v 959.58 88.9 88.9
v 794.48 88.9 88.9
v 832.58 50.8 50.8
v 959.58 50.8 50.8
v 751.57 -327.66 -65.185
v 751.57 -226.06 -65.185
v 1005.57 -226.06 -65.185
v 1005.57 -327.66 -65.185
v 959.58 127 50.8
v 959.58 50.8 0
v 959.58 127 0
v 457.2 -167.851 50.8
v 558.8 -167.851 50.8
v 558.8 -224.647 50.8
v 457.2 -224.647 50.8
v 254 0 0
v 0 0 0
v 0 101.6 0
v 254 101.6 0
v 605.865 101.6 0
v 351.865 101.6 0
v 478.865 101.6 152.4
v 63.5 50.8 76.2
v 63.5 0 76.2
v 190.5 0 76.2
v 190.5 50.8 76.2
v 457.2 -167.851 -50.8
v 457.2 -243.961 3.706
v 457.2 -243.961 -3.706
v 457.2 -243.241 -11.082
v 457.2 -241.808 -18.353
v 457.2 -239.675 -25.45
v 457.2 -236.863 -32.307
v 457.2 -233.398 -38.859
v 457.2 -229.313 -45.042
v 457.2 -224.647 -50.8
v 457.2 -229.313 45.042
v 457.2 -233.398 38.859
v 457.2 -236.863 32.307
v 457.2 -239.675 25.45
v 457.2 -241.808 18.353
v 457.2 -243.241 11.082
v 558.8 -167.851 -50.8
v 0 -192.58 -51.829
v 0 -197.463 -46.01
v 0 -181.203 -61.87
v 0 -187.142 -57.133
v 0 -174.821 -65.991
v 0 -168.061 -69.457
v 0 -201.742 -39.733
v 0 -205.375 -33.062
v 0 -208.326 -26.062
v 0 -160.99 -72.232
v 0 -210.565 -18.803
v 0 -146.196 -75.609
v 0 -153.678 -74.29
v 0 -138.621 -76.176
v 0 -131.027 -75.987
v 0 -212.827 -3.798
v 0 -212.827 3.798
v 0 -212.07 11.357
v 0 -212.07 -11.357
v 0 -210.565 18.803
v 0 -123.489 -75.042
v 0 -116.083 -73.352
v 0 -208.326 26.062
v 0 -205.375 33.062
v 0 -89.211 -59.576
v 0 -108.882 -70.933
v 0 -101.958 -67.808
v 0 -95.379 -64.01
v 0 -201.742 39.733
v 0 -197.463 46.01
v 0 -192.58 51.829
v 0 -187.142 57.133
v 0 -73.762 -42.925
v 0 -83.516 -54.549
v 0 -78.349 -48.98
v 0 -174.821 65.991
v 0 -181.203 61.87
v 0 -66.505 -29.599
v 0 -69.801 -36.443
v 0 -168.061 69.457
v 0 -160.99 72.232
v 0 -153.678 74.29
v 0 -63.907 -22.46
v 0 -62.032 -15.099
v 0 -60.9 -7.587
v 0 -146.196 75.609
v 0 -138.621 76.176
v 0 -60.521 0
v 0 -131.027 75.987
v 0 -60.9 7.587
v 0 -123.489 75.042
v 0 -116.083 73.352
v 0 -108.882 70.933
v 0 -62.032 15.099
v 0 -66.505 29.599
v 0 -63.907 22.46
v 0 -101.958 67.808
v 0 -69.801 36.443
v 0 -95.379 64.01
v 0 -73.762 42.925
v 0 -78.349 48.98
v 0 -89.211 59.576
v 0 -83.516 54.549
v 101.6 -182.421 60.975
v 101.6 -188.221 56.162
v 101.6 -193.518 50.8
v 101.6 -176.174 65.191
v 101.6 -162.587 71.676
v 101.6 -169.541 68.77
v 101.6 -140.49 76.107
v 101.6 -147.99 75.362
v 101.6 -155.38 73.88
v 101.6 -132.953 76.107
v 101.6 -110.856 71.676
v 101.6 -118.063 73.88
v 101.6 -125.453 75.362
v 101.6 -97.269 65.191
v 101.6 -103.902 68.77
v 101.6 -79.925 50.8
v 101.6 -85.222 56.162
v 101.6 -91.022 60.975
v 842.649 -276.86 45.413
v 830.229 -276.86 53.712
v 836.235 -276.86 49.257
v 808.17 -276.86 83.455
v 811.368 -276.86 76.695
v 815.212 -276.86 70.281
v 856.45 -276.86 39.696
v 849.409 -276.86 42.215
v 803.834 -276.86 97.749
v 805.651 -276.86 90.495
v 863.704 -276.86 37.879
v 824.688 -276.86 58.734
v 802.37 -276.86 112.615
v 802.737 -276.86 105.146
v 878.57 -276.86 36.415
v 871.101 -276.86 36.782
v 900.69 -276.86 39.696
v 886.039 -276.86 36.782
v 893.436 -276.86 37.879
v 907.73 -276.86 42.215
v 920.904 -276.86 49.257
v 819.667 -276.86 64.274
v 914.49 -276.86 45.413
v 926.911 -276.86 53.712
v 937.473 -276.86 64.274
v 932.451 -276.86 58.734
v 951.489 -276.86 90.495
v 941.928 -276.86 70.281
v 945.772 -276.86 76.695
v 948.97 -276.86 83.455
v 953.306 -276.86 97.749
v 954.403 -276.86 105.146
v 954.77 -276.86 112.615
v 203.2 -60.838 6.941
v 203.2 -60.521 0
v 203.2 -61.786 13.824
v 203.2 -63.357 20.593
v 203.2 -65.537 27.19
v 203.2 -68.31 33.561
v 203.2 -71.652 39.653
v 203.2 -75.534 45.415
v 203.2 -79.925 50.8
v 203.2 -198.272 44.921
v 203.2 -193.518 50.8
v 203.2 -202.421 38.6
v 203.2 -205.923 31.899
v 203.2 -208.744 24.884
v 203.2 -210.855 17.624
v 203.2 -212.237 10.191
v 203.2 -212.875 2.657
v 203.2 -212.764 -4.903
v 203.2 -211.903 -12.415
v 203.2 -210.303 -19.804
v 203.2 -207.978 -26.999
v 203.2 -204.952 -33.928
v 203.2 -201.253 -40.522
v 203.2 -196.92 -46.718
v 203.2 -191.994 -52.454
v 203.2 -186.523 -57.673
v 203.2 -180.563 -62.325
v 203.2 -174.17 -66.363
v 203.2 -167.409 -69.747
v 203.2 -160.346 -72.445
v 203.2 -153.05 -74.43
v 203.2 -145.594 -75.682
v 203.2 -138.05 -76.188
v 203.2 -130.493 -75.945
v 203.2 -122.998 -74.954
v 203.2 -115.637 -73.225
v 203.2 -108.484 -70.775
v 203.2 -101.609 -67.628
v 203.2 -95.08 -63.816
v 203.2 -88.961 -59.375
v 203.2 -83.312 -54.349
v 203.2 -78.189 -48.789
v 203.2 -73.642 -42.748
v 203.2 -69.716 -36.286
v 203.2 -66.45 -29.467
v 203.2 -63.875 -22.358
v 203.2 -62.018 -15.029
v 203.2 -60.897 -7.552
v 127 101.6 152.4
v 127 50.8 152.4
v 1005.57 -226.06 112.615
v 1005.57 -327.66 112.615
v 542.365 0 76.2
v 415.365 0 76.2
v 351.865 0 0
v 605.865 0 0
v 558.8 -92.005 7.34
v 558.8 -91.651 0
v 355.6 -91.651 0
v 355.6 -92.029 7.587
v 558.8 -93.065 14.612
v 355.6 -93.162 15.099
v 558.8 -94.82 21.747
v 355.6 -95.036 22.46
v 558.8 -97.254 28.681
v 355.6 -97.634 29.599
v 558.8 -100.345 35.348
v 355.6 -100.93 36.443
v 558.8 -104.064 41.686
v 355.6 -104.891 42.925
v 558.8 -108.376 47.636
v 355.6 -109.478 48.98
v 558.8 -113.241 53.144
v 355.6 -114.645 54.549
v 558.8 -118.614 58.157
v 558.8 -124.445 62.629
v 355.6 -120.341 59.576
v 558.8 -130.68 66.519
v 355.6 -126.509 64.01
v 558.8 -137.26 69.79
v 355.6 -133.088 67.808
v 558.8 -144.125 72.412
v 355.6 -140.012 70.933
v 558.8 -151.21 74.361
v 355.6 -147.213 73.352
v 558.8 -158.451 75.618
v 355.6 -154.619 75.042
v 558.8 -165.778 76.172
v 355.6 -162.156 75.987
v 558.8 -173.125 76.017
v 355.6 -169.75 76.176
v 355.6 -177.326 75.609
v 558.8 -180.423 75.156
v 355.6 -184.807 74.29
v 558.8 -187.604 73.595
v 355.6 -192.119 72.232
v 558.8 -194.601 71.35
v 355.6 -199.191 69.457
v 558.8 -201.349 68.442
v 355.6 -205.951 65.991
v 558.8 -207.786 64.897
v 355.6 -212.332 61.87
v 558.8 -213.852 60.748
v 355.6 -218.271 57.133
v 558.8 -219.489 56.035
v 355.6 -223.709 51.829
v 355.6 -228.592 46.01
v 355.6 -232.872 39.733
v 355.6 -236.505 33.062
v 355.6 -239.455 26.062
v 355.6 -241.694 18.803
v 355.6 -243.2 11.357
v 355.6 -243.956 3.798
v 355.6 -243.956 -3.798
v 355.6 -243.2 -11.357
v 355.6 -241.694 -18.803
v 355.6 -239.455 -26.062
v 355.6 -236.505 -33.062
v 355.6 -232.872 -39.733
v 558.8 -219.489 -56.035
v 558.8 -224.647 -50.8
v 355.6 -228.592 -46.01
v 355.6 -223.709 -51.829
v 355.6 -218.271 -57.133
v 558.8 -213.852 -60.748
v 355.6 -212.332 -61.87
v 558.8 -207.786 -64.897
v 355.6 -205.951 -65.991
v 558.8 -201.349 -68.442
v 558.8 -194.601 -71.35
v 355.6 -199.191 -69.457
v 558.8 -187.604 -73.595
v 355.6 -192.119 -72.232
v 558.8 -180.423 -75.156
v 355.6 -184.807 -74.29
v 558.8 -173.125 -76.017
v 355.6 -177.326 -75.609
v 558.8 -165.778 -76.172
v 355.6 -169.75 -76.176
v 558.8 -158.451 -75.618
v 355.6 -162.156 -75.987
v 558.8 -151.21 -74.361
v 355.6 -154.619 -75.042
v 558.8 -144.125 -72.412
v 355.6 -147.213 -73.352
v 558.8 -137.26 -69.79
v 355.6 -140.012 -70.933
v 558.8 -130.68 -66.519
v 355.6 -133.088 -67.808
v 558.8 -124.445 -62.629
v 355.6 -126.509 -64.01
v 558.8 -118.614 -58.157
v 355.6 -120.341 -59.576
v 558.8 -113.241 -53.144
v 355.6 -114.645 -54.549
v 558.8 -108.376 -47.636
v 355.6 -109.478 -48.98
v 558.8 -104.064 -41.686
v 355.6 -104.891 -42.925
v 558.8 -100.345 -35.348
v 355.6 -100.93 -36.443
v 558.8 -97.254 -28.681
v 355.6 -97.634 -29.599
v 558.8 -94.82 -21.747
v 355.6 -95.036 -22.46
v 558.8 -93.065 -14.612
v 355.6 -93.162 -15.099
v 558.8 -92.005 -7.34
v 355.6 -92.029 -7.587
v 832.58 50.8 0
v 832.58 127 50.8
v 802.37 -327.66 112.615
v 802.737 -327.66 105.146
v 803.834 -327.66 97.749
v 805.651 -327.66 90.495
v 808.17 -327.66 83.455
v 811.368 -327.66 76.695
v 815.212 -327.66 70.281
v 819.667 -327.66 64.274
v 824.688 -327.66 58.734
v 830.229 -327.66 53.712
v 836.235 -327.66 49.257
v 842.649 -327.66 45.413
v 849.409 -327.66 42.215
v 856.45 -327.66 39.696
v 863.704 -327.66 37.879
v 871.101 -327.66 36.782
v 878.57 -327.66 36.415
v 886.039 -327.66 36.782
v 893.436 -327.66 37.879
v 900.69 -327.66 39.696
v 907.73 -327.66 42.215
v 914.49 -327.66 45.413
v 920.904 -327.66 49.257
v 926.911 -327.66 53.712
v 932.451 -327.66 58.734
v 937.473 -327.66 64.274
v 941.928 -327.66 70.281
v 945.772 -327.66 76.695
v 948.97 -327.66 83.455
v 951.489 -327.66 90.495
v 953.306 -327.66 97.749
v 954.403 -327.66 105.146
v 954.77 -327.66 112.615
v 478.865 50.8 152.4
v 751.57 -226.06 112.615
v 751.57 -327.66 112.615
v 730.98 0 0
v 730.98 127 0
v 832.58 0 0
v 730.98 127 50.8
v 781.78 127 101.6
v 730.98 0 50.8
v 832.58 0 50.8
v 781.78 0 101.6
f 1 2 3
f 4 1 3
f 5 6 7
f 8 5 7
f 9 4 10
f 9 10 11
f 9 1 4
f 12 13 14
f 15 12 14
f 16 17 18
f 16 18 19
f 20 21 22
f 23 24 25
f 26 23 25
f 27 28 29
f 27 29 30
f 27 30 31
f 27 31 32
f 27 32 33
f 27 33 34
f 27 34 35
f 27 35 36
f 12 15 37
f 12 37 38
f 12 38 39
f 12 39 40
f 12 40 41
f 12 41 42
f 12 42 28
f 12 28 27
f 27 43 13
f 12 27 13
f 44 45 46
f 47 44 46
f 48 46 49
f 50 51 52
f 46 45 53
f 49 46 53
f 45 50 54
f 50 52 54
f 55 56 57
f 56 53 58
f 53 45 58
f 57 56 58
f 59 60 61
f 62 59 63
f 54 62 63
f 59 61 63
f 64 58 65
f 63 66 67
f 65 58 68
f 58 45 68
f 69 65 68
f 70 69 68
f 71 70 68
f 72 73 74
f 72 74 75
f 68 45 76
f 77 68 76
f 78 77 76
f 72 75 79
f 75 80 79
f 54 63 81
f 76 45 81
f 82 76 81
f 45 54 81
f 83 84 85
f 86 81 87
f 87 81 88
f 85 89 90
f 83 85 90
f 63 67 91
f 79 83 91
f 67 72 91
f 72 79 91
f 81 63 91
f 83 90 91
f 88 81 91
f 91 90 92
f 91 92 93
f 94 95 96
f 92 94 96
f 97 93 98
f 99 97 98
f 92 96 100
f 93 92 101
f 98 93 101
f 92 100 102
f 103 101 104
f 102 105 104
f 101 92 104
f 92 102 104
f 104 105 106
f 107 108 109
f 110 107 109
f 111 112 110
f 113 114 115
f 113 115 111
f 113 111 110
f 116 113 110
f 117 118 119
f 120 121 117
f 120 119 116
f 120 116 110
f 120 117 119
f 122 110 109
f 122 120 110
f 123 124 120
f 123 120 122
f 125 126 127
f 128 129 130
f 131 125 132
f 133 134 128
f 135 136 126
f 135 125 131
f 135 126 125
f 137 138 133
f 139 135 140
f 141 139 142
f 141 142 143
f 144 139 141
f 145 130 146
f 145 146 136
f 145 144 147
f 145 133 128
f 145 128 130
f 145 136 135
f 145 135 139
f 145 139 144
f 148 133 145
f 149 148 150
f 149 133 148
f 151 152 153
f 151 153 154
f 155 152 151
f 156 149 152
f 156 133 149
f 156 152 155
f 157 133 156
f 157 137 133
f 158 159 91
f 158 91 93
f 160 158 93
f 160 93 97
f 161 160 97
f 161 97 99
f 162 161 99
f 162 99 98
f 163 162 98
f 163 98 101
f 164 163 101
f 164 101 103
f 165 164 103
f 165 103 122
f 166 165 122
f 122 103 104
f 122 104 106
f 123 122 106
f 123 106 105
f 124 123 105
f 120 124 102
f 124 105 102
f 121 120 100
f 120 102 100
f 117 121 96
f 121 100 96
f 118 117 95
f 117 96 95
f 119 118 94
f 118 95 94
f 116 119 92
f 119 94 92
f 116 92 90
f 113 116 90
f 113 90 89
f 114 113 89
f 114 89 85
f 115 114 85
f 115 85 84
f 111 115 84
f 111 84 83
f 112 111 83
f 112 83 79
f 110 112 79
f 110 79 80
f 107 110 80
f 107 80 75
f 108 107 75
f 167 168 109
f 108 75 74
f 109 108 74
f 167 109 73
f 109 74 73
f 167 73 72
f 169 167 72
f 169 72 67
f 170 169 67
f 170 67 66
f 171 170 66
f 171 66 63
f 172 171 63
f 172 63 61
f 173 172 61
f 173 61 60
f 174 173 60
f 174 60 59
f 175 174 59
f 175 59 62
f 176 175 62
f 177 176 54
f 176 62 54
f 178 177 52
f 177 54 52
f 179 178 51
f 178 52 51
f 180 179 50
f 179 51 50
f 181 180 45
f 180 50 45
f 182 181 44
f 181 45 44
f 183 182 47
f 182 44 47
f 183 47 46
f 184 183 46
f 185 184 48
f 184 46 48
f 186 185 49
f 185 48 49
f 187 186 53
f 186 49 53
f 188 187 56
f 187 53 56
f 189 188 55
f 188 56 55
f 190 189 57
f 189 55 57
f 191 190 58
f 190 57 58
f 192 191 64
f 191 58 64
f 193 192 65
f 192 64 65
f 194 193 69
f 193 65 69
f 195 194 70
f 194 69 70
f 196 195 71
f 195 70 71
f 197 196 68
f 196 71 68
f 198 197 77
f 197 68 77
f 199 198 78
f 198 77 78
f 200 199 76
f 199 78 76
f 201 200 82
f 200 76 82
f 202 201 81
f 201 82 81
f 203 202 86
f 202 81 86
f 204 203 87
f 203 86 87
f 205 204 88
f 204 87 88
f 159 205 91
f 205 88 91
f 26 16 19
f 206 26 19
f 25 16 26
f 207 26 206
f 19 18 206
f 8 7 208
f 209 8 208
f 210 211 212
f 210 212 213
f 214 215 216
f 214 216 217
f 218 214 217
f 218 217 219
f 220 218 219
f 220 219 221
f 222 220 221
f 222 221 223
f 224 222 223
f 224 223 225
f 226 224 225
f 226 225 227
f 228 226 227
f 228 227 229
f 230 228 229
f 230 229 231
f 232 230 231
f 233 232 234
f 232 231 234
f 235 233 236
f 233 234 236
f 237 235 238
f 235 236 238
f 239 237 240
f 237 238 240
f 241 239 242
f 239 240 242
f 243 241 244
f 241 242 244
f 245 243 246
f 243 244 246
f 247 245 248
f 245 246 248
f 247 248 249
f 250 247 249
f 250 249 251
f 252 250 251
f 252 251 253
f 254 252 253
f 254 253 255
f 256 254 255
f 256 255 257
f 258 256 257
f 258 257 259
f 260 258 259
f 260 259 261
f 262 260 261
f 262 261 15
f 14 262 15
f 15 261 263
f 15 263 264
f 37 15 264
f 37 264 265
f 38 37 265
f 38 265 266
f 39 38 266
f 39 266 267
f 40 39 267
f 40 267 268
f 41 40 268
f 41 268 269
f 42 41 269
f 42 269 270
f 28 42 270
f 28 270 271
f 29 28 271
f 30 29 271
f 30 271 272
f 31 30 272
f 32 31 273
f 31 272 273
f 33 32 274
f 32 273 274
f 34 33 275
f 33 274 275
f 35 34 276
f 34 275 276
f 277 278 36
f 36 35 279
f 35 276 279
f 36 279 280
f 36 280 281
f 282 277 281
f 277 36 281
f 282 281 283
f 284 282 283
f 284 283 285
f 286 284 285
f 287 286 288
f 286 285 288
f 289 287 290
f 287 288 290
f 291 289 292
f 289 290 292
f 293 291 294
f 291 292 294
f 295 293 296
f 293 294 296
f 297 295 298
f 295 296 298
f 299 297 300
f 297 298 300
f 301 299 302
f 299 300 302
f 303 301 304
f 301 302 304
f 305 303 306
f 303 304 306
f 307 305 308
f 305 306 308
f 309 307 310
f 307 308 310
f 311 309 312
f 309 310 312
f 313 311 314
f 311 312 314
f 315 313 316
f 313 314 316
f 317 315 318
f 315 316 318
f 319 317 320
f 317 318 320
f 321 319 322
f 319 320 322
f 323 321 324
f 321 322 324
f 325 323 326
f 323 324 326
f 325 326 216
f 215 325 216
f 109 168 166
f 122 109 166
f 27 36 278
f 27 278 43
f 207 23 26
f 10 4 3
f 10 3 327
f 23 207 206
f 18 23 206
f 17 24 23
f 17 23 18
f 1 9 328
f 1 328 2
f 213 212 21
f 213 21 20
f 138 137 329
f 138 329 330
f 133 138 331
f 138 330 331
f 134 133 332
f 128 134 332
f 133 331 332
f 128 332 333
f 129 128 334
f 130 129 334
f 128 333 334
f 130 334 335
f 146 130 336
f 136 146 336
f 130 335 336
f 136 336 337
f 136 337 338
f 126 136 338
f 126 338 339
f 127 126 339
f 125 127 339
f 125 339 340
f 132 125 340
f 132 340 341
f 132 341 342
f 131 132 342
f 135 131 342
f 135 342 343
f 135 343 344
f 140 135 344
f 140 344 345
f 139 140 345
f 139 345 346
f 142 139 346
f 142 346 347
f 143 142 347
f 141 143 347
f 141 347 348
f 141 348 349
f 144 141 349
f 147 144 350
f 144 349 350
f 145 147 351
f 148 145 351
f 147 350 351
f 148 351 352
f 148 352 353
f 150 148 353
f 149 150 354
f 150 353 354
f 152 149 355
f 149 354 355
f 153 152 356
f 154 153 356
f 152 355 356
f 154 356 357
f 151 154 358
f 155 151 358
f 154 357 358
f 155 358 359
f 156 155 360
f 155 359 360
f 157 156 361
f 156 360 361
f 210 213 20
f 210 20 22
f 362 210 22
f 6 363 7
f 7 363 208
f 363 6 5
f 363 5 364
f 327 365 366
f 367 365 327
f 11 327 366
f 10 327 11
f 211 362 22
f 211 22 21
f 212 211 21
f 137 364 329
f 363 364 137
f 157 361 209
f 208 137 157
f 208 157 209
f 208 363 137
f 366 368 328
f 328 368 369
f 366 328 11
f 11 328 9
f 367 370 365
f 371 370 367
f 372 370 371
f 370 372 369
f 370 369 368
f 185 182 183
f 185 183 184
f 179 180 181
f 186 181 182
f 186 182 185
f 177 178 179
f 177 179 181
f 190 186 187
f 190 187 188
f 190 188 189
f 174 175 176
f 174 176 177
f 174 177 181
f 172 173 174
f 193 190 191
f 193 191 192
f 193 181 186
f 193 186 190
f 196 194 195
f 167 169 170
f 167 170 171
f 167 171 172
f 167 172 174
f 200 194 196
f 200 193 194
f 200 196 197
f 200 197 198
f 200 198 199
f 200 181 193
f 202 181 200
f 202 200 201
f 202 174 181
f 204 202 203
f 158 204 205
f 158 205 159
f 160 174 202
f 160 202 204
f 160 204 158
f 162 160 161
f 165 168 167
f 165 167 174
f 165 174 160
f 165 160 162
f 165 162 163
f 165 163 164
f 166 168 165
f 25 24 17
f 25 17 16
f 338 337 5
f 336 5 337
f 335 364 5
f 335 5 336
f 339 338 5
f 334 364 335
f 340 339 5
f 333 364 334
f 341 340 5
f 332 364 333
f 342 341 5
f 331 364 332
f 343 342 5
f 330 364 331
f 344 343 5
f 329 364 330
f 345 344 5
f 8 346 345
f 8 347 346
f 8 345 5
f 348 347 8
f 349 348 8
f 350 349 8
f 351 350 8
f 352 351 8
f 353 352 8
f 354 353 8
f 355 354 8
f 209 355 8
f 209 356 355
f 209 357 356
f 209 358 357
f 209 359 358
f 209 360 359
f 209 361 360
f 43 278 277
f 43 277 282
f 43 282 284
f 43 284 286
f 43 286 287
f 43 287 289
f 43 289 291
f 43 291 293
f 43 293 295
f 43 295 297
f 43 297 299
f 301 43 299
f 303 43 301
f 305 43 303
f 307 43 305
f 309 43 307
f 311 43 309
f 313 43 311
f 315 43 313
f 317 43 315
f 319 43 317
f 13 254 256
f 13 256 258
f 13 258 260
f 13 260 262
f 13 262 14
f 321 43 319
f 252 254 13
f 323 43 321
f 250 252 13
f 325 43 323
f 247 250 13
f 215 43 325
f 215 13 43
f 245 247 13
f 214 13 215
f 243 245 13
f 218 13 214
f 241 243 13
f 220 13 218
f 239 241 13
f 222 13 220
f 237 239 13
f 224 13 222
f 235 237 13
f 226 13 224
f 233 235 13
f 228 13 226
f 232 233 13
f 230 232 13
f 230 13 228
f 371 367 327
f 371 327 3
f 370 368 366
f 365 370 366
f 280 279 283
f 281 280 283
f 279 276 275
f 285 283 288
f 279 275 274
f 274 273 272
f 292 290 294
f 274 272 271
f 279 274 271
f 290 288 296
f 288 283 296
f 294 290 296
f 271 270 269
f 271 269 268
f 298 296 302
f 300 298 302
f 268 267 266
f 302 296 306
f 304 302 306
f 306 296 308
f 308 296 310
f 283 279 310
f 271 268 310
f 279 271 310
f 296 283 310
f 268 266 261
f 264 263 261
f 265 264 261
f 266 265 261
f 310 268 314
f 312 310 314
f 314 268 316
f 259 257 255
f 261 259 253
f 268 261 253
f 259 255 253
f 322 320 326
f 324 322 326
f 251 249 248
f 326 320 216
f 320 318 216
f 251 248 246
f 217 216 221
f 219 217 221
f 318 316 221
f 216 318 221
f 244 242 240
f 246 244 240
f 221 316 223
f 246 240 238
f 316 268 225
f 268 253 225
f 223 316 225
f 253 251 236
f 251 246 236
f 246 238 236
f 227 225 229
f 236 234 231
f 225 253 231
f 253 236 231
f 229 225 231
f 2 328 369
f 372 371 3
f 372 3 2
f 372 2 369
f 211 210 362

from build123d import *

# Parameters (mm, degrees)
F1_DEPTH  = 101.6
F3_DEPTH  = 50.8
F5_DEPTH  = 101.6
F9_DEPTH  = 76.2
F11_DEPTH = 127
F15_R     = 76.2
F16_DEPTH = 203.2
F18_DEPTH = 101.6
F20_R     = 76.2
F21_DEPTH = 203.2
F24_DEPTH = 101.6
F25_W     = 254
F25_H     = 177.8
F26_DEPTH = 101.6
F28_DEPTH = 50.8


with BuildPart() as f1:
    # F0 (on Front) → F1 (new body)
    with BuildSketch(Plane.XZ):
        Polygon((127, 152.4), (0, 0), (254, 0), align=None)
    extrude(amount=-F1_DEPTH)

    # F2 (on face) → F3 (cut)
    with BuildSketch(Plane.XZ):
        Polygon((127, 152.4), (63.5, 76.2), (190.5, 76.2), align=None)
    extrude(amount=-F3_DEPTH, mode=Mode.SUBTRACT)


with BuildPart() as f5:
    # F4 (on Front) → F5 (new body)
    with BuildSketch(Plane.XZ):
        Polygon((478.864695549, 152.4), (351.864695549, 0), (605.864695549, 0), align=None)
    extrude(amount=-F5_DEPTH)

    # F8 (on 3pt) → F9 (cut, symmetric)
    with BuildSketch(Plane.YZ.offset(478.864695549)):
        Polygon((0, 152.4), (0, 76.2), (50.8, 152.4), align=None)
    extrude(amount=F9_DEPTH, both=True, mode=Mode.SUBTRACT)


with BuildPart() as f11:
    # F10 (on Front) → F11 (new body)
    with BuildSketch(Plane.XZ):
        Polygon((730.9796256996, 50.8), (730.9796256996, 0), (832.5796256996, 0), (832.5796256996, 50.8), (781.7796256996, 101.6), align=None)
    extrude(amount=-F11_DEPTH)

    # F13 (on offset) → F14 (join, up to the next surface of F11)
    with BuildSketch(Plane.YZ.offset(959.5796256996)):
        Polygon((50.8, 50.8), (50.8, 0), (127, 0), (127, 50.8), (88.8999967435, 88.9), align=None)
    extrude(until=Until.NEXT, dir=(-1, 0, 0))


with BuildPart() as f16:
    # F15 (on Right) → F16 (new body)
    with BuildSketch(Plane.YZ):
        with Locations((-136.7214130477, 0)):
            Circle(F15_R)
    extrude(amount=F16_DEPTH)

    # F17 (on face) → F18 (cut)
    with BuildSketch(Plane.YZ.offset(203.2)):
        with BuildLine():
            ThreePointArc((-79.9252864192, 50.8), (-136.7214130477, 76.2), (-193.5175396762, 50.8))
            Line((-193.5175396762, 50.8), (-79.9252864192, 50.8))
        make_face()
    extrude(amount=-F18_DEPTH, mode=Mode.SUBTRACT)


with BuildPart() as f21:
    # F20 (on offset) → F21 (new body)
    with BuildSketch(Plane.YZ.offset(355.6)):
        with Locations((-167.850779579, 0)):
            Circle(F20_R)
    extrude(amount=F21_DEPTH)

    # F23 (on face) → F24 (cut)
    with BuildSketch(Plane.YZ.offset(558.8)):
        with BuildLine():
            Line((-167.850779579, 50.8), (-224.6469062075, 50.8))
            ThreePointArc((-224.6469062075, 50.8), (-244.050779579, 0), (-224.6469062075, -50.8))
            Line((-224.6469062075, -50.8), (-167.850779579, -50.8))
            Line((-167.850779579, -50.8), (-167.850779579, 50.8))
        make_face()
    extrude(amount=-F24_DEPTH, mode=Mode.SUBTRACT)


with BuildPart() as f26:
    # F25 (on offset) → F26 (new body)
    with BuildSketch(Plane.XZ.offset(226.06)):
        with Locations((878.5699307919, 23.7150967563)):
            Rectangle(F25_W, F25_H)
    extrude(amount=F26_DEPTH)

    # F27 (on face) → F28 (cut)
    with BuildSketch(Plane.XZ.offset(327.66)):
        with BuildLine():
            Line((802.3699307919, 112.6150967563), (954.7699307919, 112.6150967563))
            ThreePointArc((954.7699307919, 112.6150967563), (878.5699307919, 188.8150967563), (802.3699307919, 112.6150967563))
        make_face()
        with BuildLine():
            ThreePointArc((802.3699307919, 112.6150967563), (878.5699307919, 36.4150967563), (954.7699307919, 112.6150967563))
            Line((954.7699307919, 112.6150967563), (802.3699307919, 112.6150967563))
        make_face()
    extrude(amount=-F28_DEPTH, mode=Mode.SUBTRACT)


solid = Compound([f1.part, f5.part, f11.part, f16.part, f21.part, f26.part])
